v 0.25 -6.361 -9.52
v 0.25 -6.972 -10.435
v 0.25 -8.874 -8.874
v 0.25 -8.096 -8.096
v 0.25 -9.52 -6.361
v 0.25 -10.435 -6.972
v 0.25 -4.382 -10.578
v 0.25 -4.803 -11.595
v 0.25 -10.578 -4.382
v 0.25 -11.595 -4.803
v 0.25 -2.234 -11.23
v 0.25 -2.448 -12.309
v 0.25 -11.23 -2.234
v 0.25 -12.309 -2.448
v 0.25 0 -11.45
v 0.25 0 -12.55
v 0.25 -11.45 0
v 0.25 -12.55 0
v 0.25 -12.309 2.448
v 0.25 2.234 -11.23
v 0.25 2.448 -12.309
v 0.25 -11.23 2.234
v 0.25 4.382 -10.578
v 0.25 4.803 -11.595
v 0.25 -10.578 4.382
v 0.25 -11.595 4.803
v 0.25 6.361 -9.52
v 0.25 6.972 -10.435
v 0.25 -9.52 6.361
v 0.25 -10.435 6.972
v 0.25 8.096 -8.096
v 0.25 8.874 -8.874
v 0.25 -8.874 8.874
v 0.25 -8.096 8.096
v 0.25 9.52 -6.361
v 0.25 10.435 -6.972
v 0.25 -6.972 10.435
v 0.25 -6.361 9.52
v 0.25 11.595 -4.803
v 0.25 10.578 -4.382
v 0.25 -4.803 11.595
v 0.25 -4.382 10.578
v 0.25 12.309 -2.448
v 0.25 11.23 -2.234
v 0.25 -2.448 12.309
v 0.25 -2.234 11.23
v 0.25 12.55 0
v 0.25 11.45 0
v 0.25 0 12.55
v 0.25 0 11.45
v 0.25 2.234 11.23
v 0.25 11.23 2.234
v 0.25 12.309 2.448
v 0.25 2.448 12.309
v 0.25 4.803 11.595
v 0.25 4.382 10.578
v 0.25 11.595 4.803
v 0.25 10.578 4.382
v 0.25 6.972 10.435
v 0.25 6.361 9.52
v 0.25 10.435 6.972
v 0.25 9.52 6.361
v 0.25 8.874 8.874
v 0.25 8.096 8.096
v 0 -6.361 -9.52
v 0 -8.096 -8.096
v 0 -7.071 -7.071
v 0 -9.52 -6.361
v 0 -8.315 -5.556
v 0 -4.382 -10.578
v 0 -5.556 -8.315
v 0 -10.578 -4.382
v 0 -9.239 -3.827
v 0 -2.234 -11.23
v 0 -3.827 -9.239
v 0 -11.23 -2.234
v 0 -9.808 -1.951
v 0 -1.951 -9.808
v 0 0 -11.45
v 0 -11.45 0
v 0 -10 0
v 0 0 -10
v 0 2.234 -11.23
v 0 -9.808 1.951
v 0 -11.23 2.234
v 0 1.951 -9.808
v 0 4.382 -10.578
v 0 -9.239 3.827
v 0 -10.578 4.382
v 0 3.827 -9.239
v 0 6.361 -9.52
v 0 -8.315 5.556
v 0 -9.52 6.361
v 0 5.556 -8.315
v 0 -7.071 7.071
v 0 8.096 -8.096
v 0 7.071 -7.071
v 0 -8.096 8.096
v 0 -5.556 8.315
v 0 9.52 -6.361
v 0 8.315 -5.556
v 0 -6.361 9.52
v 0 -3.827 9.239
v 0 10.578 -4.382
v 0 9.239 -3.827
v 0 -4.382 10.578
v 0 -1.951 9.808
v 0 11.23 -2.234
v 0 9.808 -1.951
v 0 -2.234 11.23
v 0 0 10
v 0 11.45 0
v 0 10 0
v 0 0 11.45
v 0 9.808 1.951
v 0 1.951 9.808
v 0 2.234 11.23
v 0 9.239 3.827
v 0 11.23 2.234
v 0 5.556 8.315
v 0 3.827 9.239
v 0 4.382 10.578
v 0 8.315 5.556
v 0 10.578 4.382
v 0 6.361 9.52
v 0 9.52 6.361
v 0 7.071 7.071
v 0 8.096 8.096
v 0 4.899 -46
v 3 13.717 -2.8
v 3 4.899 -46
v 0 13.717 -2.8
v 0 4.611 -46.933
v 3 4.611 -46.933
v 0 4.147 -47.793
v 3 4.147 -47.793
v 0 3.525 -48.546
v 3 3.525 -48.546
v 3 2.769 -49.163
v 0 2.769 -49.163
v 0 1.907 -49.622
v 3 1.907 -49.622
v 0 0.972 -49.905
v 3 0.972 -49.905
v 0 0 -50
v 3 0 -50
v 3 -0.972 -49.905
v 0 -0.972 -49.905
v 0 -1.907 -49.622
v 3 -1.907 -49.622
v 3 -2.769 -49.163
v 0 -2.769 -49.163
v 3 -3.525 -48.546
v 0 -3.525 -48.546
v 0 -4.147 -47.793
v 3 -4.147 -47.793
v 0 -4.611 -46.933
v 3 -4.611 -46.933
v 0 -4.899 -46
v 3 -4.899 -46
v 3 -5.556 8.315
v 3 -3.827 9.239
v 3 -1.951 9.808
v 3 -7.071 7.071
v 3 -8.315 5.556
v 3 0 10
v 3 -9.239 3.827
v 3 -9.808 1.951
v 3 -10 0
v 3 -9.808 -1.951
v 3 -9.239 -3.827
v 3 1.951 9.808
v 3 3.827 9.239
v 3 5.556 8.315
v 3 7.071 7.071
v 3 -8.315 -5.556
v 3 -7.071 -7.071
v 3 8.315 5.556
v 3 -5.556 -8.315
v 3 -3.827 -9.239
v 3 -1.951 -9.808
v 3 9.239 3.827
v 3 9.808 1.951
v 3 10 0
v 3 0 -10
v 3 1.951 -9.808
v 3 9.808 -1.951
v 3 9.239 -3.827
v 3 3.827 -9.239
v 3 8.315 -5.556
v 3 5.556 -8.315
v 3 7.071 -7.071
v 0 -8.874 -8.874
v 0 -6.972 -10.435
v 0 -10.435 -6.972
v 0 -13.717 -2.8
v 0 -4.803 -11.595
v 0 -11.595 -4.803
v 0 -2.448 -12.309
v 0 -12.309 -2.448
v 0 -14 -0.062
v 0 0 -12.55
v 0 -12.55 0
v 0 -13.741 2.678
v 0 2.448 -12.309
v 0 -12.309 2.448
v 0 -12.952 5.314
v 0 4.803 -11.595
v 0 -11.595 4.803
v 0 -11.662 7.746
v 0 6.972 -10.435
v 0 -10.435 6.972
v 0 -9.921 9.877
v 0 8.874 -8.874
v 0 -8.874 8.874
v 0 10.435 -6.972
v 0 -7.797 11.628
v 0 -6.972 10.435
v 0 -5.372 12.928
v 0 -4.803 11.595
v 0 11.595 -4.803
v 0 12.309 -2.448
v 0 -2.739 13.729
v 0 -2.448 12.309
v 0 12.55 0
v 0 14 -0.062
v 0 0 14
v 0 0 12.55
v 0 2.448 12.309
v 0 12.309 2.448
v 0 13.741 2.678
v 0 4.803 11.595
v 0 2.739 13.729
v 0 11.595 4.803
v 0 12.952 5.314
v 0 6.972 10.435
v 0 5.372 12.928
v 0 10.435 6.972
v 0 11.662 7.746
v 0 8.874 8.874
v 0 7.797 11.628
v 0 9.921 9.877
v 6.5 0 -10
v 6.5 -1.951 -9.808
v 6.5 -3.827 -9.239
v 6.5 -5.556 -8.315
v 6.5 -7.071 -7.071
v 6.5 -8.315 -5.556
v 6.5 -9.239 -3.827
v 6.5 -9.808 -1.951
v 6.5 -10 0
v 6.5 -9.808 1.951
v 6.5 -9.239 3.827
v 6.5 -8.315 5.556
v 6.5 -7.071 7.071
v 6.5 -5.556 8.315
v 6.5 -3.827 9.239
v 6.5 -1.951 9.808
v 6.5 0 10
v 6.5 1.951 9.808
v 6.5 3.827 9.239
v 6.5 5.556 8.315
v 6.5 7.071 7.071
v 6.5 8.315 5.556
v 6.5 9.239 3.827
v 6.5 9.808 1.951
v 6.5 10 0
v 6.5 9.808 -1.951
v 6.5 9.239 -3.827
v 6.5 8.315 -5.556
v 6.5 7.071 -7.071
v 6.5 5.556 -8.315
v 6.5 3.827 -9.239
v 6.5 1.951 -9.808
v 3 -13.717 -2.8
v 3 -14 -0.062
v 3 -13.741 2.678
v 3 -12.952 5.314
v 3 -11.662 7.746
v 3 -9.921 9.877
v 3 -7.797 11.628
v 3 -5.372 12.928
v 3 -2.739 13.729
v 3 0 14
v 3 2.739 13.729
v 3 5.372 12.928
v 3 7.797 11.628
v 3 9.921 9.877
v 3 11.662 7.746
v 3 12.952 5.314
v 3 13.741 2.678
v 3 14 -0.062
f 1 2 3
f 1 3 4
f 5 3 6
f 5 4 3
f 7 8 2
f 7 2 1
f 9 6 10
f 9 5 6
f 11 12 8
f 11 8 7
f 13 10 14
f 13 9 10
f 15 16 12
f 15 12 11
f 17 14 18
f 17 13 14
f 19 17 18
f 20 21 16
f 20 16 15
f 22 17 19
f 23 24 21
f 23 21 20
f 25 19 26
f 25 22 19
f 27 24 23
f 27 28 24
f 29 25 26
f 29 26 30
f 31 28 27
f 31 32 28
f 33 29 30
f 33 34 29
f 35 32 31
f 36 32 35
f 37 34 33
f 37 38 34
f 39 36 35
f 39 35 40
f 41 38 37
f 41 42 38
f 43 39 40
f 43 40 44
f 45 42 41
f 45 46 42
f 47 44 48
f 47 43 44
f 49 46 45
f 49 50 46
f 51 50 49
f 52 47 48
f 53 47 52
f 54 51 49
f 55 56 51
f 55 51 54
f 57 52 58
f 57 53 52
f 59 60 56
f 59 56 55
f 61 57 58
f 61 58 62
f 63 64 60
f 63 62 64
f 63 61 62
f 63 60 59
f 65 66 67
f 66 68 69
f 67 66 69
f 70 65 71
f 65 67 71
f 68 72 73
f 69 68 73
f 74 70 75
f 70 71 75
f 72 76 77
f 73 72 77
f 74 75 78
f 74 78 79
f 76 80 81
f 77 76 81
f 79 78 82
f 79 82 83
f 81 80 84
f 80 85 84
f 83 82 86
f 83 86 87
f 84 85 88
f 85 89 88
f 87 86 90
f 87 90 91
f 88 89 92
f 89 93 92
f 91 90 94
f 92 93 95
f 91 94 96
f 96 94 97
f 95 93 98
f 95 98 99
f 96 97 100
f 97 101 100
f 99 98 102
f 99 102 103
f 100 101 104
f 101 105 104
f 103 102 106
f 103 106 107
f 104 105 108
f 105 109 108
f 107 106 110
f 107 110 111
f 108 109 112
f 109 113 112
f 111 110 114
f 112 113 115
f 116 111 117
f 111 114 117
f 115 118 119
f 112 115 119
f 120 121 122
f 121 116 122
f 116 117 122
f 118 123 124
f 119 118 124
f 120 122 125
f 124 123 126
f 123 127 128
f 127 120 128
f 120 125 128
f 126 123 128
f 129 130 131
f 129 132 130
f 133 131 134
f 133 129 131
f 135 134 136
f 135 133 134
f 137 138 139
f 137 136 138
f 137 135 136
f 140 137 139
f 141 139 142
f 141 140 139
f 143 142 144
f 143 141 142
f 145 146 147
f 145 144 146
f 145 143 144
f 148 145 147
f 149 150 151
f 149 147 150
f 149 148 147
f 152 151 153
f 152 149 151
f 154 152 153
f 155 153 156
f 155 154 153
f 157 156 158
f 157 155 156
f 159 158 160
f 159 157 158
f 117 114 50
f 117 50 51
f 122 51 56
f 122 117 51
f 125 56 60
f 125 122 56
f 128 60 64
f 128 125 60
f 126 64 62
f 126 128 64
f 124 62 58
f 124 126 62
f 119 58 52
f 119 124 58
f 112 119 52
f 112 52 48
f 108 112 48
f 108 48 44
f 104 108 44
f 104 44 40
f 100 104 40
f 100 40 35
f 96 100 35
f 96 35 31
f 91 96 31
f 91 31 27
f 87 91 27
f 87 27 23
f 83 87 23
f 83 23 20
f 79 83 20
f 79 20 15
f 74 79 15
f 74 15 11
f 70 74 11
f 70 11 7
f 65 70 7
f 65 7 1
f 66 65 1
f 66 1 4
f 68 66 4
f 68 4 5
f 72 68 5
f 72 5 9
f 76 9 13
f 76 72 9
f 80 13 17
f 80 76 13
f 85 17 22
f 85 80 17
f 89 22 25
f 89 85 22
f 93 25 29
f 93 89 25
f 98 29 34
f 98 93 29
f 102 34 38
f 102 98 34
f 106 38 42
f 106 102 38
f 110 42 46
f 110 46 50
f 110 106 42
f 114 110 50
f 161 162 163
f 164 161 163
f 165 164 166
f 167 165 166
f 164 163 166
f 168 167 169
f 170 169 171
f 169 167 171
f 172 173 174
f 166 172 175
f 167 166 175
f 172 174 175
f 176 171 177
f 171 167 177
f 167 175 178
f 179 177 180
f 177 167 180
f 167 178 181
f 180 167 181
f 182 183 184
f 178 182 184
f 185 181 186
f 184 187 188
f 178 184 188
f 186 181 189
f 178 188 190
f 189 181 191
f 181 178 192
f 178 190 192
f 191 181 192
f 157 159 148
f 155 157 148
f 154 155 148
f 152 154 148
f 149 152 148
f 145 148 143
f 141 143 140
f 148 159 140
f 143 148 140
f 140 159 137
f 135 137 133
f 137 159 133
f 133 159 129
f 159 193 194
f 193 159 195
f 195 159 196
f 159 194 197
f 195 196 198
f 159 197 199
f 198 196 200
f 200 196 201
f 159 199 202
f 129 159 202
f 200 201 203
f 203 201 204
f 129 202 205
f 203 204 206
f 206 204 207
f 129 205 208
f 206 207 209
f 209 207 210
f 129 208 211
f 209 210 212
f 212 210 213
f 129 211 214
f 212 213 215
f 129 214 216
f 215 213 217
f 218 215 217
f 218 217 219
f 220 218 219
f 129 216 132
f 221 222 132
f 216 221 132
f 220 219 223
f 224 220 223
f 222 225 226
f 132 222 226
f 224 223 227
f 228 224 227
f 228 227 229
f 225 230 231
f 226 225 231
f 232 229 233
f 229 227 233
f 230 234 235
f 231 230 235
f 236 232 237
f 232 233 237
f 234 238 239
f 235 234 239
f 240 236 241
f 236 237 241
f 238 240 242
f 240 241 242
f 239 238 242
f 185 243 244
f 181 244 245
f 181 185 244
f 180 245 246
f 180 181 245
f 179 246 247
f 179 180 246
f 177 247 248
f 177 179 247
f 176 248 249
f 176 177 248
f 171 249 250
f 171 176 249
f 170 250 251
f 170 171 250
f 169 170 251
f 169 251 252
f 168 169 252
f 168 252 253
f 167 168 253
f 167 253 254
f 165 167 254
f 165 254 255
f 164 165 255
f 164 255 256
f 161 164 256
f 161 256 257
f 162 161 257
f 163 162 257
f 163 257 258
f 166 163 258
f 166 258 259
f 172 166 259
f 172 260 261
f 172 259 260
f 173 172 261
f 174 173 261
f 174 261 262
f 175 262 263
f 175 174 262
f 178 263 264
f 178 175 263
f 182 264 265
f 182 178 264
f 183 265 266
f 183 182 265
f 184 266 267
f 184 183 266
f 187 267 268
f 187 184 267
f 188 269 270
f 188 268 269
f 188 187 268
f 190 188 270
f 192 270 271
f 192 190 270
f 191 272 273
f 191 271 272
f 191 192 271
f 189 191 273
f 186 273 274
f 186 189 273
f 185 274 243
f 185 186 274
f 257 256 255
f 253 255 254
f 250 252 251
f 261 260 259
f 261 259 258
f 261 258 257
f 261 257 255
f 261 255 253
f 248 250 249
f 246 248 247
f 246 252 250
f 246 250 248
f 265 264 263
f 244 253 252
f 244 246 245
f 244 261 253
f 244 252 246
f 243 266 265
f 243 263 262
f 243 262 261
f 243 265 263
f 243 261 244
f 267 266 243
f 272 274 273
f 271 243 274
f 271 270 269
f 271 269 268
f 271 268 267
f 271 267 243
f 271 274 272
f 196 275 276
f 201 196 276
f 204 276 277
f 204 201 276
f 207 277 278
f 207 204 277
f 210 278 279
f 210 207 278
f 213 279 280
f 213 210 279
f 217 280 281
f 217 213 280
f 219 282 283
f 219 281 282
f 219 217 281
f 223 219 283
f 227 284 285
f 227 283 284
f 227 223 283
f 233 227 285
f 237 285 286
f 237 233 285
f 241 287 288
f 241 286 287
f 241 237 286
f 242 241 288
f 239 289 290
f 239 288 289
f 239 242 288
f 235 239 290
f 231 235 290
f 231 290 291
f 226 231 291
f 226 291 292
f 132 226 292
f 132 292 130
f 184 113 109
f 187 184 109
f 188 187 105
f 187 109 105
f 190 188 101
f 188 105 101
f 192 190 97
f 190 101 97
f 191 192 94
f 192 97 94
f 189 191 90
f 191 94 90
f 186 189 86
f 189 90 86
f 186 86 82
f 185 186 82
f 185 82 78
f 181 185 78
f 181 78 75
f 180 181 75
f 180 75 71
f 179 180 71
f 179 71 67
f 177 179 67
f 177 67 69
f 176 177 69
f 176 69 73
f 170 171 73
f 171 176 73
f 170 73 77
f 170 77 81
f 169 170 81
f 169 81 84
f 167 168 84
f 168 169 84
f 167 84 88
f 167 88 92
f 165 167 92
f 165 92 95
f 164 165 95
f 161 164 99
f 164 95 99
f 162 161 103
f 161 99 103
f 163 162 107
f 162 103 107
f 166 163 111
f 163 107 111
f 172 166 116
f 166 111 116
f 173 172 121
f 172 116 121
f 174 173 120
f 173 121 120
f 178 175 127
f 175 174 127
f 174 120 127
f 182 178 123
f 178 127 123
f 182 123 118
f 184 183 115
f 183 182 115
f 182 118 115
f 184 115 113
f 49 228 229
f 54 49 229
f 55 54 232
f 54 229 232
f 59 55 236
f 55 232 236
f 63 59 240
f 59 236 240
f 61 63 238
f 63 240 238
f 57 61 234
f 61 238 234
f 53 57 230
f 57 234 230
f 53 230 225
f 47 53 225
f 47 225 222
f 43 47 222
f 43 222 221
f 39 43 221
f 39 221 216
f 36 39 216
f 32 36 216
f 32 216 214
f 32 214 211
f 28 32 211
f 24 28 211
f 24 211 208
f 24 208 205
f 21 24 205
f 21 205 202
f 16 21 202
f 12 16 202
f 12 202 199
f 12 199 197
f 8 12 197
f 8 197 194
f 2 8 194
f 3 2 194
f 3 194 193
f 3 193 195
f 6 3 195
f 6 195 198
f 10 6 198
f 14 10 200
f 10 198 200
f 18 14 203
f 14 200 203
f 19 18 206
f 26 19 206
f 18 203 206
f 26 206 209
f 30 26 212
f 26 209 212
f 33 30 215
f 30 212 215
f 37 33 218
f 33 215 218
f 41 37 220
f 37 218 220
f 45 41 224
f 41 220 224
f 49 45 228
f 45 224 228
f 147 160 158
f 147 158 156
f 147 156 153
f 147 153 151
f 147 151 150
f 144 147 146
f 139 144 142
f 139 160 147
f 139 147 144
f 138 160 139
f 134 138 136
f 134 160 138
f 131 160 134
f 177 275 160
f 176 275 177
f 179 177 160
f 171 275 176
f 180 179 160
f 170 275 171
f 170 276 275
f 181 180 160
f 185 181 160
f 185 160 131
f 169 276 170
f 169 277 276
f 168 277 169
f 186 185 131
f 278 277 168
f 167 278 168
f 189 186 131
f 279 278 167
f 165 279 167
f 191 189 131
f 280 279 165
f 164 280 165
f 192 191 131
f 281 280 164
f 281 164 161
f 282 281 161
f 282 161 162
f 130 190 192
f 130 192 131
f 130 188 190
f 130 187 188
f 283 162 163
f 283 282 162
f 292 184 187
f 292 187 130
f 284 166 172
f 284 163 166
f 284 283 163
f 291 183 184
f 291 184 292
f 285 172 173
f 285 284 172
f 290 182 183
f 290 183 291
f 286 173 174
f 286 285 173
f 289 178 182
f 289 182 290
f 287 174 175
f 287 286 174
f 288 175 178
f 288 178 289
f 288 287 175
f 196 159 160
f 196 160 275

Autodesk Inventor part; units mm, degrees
ref_plane "YZ Plane" through (0, 0, 0) normal (1, 0, 0) x (0, 1, 0)
ref_plane "XZ Plane" through (0, 0, 0) normal (0, 1, 0) x (-1, 0, 0)
ref_plane "XY Plane" through (0, 0, 0) normal (0, 0, 1) x (1, 0, 0)
sketch "スケッチ1" plane through (0, 0, 0) normal (1, 0, 0) x (0, 1, 0)
  circle A0 centre (0, 0) radius 10
  line L0 (0, 0) -> (0, -45) construction
  arc A1 (0, -40) -> (-4.899, -46) centre (0, -45) ccw construction
  arc A2 (13.7171, -2.8) -> (-13.7171, -2.8) centre (0, 0) ccw
  line L1 (13.7171, -2.8) -> (4.899, -46)
  line L2 (-4.899, -46) -> (-13.7171, -2.8)
  arc A3 (0, -14) -> (13.7171, -2.8) centre (0, 0) ccw construction
  arc A4 (-13.7171, -2.8) -> (0, -14) centre (0, 0) ccw construction
  arc A5 (4.899, -46) -> (0, -40) centre (0, -45) ccw construction
  arc A6 (-4.899, -46) -> (4.899, -46) centre (0, -45) ccw
  dimension "d0" = 20
  dimension "d1" = 28
  dimension "d2" = 10
  dimension "d3" = 45
extrude "押し出し1" add sketch "スケッチ1" along normal blind 3
sketch "スケッチ2" plane through (3, 0, 0) normal (1, 0, 0) x (0, 0, -1)
  circle A0 centre (0, 0) radius 7.5
  circle A1 centre (0, 0) radius 10 projected
  dimension "d7" = 15
extrude "押し出し2" add sketch "スケッチ2" along normal blind 3.5 contours A0 | A1
sketch "スケッチ3" plane through (0, 0, 0) normal (-1, 0, 0) x (0, 0, 1)
  circle A0 centre (0, 0) radius 12 construction
  circle A1 centre (0, 0) radius 12.55
  circle A2 centre (0, 0) radius 11.45
  dimension "d10" = 24
  dimension "d11" = 0.55
  dimension "d12" = 0.55
extrude "押し出し3" cut sketch "スケッチ3" against normal blind 0.25
properties part number "ANKLE_DRIVER_LOD"
